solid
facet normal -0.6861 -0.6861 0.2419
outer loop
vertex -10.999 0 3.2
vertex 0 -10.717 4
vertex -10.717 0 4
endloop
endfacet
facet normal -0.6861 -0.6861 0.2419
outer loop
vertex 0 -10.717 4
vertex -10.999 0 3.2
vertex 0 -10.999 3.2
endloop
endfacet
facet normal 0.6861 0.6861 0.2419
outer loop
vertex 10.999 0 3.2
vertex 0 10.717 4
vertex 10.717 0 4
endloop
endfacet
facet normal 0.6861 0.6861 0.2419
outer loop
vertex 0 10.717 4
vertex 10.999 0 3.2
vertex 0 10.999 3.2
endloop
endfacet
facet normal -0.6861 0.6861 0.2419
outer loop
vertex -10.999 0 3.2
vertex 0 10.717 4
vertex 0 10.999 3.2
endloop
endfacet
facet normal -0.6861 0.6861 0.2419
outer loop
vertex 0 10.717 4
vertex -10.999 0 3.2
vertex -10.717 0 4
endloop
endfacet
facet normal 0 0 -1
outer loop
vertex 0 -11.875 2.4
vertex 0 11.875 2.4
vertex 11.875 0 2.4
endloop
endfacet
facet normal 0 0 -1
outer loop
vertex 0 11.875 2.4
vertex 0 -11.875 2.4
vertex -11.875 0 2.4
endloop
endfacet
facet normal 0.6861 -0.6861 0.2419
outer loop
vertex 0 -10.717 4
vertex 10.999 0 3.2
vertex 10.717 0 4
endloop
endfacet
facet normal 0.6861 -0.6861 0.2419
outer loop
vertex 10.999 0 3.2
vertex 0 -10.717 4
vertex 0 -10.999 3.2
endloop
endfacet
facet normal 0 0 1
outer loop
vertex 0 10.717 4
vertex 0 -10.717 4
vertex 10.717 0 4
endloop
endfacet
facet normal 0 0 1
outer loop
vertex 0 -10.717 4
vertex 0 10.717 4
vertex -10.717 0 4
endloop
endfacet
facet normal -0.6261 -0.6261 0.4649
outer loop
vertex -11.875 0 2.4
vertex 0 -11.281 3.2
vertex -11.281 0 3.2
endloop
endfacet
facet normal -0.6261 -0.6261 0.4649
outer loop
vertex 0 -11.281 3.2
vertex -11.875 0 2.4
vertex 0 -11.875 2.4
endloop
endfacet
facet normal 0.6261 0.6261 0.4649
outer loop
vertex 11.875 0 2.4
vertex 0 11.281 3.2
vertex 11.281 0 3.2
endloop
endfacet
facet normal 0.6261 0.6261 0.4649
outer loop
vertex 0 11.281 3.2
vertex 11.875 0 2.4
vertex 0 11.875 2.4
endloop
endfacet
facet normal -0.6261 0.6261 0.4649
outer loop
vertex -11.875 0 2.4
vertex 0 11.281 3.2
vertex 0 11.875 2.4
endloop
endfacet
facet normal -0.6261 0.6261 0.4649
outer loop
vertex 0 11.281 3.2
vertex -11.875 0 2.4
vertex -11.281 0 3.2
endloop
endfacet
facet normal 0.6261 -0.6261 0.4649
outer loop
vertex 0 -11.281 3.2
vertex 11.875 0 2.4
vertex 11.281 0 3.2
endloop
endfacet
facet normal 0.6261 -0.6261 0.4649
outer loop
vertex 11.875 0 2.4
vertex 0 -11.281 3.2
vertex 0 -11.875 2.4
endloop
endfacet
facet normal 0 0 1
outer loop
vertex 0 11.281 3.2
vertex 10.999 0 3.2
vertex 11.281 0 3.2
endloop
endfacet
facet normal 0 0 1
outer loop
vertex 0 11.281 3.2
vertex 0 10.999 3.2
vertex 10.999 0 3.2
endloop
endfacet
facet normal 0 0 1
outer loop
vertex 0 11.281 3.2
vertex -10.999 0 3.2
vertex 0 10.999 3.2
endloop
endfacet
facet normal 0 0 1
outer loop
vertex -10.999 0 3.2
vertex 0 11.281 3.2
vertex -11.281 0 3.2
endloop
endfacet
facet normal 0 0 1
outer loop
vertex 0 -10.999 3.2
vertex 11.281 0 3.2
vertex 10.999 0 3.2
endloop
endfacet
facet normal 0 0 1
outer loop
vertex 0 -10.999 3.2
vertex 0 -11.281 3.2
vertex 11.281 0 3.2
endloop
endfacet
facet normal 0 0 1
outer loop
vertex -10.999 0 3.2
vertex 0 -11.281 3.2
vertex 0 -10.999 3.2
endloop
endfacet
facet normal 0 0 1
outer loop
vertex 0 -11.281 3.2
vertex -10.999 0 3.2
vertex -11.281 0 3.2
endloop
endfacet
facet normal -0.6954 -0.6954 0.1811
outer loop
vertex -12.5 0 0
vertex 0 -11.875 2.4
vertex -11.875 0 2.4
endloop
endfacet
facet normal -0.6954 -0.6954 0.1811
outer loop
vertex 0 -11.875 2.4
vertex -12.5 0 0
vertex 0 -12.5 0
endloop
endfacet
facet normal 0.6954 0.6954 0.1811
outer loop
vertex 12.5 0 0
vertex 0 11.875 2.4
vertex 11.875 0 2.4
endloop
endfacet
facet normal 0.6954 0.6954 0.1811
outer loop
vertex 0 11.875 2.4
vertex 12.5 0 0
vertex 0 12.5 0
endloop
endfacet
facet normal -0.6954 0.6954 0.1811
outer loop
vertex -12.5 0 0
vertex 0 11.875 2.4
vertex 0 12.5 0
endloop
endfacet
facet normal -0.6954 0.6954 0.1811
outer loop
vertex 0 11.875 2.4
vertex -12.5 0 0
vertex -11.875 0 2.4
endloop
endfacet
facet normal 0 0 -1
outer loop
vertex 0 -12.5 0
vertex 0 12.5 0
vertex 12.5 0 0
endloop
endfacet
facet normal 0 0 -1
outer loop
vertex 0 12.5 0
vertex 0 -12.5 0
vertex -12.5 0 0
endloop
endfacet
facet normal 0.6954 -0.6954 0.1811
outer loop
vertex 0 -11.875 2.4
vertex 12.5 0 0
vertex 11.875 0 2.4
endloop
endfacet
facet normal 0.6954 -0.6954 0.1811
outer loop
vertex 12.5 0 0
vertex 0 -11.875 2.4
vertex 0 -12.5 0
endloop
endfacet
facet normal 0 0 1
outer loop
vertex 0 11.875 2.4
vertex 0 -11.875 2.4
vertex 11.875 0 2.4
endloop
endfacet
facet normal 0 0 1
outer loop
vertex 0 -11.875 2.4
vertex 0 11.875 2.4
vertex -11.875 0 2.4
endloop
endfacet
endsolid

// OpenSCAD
// file: build.scad
$build_id = "";

function building(filename) = is_undef(filename) ?
  !is_undef(build)
  : !is_undef(build) && build == filename;

function previewing() = !building();

module build(filename) {
  $build_id = filename;

  if(!is_undef(scad_build_scan) && scad_build_scan == true) {
    echo(str("scad_build_scan: ", filename));
  }
  else if(previewing() || build == filename) {
    children();
  }
}

module preview_row(spacing) {
  if(previewing()) {
    for(x = [0:1:$children - 1]) {
      translate([x * spacing, 0, 0]) {
        children(x);
      }
    }
  }
  else {
    children();
  }
}

module preview_column(spacing) {
  if(previewing()) {
    for(y = [0:1:$children - 1]) {
      translate([0, y * spacing, 0]) {
        children(y);
      }
    }
  }
  else {
    children();
  }
}
// file: minibase.scad
// Based off of titancraft's Customizable Miniature Base (CC0 1.0)
// https://www.thingiverse.com/thing:1112237

include <./build.scad>

$base_rim = 1; //	[1: tapered, 2: inclined, 3: flat]
// Number of sides:
$base_shape = 100; //	[30:Low-res Circle, 100: Hi-res Circle, 5:Pentagon, 6:Hexagon, 8:Octagon, 4:Square, 3:Triangle]

$base_diameter = 32;
$base_height = 4;
$base_slant = 95; // [50:100]

// Percentage:
$base_stretch = 100;

//('Cool' base only)
$base_inner_circle_ratio = 40; // [10:80]

module tapered(r=40) {
  $base_rim = 1;
  $base_inner_circle_ratio = r;

  children();
}

module inclined() {
  $base_rim = 2;

  children();
}

module flat() {
  $base_rim = 3;

  children();
}

module shape(s) {
  $base_shape = s;

  children();
}

module diameter(d) {
  $base_diameter = d;

  children();
}

module height(h) {
  $base_height = h;

  children();
}

module slant(s) {
  $base_slant = s;

  children();
}

module stretch(s) {
  $base_stretch = s;

  children();
}

module base(id) {
  build(id) union() {
    radius = $base_diameter/2;
    scale([$base_stretch/100, 1, 1]){
      if ($base_rim == 1){
        // tapered base
        cyl1_height = $base_height * (1-$base_inner_circle_ratio/100);
        cylinder(cyl1_height, radius, radius * $base_slant/100, $fn=$base_shape);

        cyl2_radius = radius  * $base_slant/100 * .95;
        cyl2_height = $base_height - cyl1_height;

        translate([0, 0, cyl1_height]){
          cylinder(cyl2_height, cyl2_radius, cyl2_radius * $base_slant/100, $fn=$base_shape);
          cylinder(cyl2_height*.5, radius * $base_slant/100, cyl2_radius, $fn=$base_shape);
        }
      } else if ($base_rim == 2){
        // inclined base
        cylinder($base_height, radius, radius * $base_slant/100, $fn=$base_shape);
      } else if ($base_rim == 3){
        // flat base

        cylinder($base_height, radius, radius, $fn=$base_shape);
      }
    }
  }
}
// main file
include <./minibase.scad>

tapered() diameter(25) shape(4) base("25mm-square");
